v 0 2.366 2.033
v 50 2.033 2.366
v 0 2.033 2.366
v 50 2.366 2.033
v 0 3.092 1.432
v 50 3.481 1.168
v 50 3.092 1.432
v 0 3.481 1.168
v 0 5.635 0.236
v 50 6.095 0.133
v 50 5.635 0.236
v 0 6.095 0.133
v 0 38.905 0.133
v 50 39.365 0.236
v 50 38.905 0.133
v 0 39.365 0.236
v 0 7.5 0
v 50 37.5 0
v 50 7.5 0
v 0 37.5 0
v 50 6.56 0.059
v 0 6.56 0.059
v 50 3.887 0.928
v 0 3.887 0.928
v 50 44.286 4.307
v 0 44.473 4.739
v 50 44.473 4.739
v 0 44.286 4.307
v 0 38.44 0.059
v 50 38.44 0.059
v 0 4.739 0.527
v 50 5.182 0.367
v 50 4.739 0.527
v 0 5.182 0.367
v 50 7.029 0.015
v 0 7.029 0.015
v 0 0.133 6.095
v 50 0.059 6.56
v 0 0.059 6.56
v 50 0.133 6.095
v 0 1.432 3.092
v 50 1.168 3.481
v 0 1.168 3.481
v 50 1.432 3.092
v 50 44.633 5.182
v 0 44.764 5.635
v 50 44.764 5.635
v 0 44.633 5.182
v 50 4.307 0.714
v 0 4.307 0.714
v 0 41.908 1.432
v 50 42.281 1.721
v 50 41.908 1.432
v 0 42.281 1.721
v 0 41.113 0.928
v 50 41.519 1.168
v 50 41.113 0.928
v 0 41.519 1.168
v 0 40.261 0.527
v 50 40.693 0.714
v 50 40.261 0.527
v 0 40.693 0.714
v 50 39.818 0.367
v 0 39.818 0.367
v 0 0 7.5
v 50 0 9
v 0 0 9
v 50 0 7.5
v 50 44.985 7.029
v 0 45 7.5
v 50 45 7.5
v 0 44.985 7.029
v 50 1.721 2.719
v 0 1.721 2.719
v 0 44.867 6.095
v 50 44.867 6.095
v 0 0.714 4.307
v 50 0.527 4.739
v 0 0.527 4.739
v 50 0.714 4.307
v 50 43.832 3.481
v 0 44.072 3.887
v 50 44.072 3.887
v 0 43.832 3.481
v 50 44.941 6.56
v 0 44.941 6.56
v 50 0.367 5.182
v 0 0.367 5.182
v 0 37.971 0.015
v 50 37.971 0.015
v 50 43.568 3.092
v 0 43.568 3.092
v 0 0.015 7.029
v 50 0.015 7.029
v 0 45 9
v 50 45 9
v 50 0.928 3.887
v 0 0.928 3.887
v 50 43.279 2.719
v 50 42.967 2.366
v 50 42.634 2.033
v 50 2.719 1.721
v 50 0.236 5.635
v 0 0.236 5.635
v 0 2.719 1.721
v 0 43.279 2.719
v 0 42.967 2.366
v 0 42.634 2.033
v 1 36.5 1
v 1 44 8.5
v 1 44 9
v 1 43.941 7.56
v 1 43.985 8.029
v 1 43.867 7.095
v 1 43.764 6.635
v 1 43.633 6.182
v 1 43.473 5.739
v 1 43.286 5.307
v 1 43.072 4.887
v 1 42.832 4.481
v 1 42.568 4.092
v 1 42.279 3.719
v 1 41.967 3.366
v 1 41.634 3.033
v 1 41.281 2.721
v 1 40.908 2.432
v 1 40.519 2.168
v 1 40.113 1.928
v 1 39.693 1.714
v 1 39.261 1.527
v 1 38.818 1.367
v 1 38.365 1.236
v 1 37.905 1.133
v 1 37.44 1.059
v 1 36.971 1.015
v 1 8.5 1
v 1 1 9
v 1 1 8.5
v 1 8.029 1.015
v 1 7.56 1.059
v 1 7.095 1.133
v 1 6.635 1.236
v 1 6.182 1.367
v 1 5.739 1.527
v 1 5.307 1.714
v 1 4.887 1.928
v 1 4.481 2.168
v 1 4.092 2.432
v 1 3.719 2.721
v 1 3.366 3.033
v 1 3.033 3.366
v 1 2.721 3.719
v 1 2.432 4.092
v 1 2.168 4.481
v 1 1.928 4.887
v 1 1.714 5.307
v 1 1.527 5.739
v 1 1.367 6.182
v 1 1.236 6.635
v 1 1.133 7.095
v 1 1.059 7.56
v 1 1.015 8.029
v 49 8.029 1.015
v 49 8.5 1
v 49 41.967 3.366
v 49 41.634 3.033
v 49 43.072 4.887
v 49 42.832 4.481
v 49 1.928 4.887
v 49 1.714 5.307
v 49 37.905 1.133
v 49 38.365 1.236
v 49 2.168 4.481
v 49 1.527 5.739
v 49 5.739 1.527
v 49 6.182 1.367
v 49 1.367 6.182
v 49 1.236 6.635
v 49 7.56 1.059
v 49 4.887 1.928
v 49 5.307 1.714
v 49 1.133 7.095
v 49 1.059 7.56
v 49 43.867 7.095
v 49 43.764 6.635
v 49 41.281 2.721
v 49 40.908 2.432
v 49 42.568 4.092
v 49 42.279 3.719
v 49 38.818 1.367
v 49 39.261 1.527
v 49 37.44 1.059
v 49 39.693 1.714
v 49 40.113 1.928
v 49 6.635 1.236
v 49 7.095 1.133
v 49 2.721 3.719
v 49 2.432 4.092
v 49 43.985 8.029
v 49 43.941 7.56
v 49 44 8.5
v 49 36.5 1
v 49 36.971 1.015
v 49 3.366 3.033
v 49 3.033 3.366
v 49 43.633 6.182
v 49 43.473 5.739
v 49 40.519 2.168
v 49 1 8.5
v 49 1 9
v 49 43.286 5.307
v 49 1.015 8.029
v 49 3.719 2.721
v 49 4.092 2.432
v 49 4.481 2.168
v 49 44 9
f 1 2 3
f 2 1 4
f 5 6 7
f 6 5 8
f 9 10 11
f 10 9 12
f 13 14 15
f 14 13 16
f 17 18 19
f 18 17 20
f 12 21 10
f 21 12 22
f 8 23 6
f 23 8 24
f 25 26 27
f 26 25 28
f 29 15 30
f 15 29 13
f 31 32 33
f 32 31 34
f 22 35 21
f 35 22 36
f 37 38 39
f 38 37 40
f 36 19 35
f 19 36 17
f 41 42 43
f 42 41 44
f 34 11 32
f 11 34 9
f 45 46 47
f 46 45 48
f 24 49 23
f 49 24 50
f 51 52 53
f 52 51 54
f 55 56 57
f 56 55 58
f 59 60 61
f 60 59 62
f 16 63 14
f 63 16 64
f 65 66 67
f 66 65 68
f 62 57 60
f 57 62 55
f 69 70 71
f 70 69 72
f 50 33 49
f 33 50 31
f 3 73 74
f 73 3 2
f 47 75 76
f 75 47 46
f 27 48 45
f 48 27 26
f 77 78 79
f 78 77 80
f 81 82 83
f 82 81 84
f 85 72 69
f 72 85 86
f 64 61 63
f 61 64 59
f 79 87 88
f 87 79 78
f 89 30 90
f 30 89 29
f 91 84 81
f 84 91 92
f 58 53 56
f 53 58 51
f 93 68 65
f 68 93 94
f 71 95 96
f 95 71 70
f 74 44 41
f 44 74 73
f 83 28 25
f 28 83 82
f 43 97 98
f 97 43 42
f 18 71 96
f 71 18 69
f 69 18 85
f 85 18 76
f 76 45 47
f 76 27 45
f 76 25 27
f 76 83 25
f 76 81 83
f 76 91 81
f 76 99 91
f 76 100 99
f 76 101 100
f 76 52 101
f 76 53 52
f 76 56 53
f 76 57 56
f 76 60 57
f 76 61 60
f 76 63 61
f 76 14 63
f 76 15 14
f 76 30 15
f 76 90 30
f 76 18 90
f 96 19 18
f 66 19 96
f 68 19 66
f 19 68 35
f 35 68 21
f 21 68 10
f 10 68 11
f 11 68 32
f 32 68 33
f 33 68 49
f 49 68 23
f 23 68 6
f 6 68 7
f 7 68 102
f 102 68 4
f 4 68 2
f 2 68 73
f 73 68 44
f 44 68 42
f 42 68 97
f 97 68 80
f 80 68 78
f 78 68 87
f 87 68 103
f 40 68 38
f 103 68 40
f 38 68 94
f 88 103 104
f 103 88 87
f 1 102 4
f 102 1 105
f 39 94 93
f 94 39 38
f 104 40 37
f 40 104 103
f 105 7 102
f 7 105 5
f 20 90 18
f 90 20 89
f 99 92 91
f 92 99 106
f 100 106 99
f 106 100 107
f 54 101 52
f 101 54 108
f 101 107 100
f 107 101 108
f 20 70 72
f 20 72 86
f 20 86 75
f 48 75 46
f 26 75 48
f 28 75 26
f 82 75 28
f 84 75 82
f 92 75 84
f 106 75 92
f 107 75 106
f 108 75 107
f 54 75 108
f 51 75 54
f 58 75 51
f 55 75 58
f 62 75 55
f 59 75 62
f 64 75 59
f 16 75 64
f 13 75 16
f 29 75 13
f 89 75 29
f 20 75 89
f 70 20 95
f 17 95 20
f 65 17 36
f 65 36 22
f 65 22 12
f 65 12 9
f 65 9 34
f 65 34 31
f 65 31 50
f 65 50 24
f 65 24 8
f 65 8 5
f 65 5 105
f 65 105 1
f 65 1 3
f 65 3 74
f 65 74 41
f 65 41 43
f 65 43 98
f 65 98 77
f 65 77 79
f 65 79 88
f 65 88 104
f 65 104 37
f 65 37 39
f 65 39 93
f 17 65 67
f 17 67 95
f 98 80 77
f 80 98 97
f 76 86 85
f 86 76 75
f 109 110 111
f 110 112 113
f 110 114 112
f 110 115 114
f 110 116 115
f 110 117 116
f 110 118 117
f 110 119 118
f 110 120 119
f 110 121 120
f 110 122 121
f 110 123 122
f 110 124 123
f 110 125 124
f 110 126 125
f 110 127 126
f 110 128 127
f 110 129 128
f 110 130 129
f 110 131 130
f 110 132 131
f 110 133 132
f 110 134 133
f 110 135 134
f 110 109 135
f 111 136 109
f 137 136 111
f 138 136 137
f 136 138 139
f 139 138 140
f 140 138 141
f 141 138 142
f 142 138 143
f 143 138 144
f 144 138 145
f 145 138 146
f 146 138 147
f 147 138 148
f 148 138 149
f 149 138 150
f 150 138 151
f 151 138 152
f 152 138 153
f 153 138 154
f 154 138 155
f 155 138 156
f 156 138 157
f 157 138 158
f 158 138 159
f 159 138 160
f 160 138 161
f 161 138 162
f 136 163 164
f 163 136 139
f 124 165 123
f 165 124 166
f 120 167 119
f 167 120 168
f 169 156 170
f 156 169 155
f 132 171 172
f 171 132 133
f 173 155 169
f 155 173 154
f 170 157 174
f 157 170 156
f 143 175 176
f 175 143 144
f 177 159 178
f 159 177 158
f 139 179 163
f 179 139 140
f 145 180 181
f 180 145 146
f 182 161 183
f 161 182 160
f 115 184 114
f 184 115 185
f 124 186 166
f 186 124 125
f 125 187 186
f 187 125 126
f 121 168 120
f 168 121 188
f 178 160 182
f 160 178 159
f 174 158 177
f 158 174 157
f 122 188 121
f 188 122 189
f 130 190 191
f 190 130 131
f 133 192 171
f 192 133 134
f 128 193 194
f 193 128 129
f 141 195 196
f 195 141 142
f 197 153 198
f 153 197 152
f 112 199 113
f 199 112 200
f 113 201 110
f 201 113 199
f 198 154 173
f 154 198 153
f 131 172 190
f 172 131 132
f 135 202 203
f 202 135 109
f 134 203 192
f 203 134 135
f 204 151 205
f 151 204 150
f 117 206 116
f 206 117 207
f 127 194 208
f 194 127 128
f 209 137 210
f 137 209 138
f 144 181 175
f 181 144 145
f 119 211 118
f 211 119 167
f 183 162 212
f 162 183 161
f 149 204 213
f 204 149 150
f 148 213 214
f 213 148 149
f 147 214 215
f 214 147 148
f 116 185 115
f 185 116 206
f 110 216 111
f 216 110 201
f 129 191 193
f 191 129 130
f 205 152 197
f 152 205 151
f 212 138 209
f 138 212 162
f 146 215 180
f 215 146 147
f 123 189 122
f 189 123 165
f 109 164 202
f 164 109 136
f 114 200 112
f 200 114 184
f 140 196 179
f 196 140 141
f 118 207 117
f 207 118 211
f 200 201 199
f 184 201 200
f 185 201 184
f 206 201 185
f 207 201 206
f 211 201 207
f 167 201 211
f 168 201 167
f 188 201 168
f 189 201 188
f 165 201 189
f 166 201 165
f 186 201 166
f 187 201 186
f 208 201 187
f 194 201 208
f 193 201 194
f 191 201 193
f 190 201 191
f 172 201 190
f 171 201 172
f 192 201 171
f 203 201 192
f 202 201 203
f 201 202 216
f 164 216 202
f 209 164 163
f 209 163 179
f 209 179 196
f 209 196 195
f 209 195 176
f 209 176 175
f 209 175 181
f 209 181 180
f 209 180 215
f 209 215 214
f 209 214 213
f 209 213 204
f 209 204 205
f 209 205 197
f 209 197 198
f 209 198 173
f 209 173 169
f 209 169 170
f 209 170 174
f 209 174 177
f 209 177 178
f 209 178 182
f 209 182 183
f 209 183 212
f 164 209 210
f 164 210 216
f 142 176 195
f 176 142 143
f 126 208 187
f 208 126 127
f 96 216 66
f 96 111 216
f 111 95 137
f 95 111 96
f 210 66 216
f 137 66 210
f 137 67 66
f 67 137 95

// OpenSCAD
$fn = 100;
epsilon = 1;

bedWidth = 50;
bedHeight = 30*0.3;
bedDepth = 150*0.3;

bedRoundingSize = [5/3 * bedHeight, 5/3 * bedHeight, 1];

wallThickness = 1;


echo("Volume:",
    (
        (
            (PI * (bedRoundingSize[0] / 2) * (bedRoundingSize[1] / 2)) / 2
            +
            (bedDepth - bedRoundingSize[0]) * bedHeight
        )
        * bedWidth
    )
    / pow(10, 3)
);

rotate([
    90,
    0,
    90
])
difference() {
    translate([
        bedRoundingSize[0]/2,
        bedRoundingSize[1]/2,
        0
    ])
    minkowski() {
        cube([
            bedDepth - bedRoundingSize[0],
            bedHeight * 2 - bedRoundingSize[1],
            bedWidth - bedRoundingSize[2]
        ]);
        resize(bedRoundingSize)
        cylinder();
    }

    translate([
        bedRoundingSize[0]/2 + wallThickness,
        bedRoundingSize[1]/2 + wallThickness,
        wallThickness
    ])
    minkowski() {
        cube([
            bedDepth - bedRoundingSize[0] - wallThickness * 2,
            bedHeight * 2 - bedRoundingSize[1] - wallThickness * 2,
            bedWidth - bedRoundingSize[2] - wallThickness * 2
        ]);
        resize(bedRoundingSize)
        cylinder();
    }

    translate([
        -epsilon,
        bedHeight,
        -epsilon
    ])
    cube([
        bedDepth +  epsilon * 2,
        bedHeight + epsilon,
        bedWidth + epsilon * 2
    ]);
}
